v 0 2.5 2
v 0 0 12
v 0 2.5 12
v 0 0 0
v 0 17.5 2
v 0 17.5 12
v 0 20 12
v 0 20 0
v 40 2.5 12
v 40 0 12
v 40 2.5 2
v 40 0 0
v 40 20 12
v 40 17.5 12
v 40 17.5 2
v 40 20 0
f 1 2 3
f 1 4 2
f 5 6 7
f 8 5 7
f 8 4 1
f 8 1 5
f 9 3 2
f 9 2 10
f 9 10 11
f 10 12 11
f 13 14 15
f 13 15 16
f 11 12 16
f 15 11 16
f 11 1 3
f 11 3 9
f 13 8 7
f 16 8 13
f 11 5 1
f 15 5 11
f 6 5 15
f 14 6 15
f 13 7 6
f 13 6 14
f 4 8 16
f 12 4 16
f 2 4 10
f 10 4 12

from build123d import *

# Parameters (mm, degrees)
SKETCH_W     = 40
SKETCH_H     = 20
PAD_DEPTH    = 2
SKETCH001_W  = 40
SKETCH001_H  = 2.5
PAD001_DEPTH = 10


with BuildPart() as part:
    # Sketch → Pad (new body)
    with BuildSketch(Plane.XY):
        with Locations((20, 10)):
            Rectangle(SKETCH_W, SKETCH_H)
    extrude(amount=PAD_DEPTH)

    # Sketch001 (on Face6 of Pad) → Pad001 (join)
    with BuildSketch(Plane.XY.offset(2)):
        with Locations((20, 1.25)):
            Rectangle(SKETCH001_W, SKETCH001_H)
        with Locations((20, 18.75)):
            Rectangle(SKETCH001_W, SKETCH001_H)
        Polygon((0, 2.5), (0, 0), align=None)
    extrude(amount=PAD001_DEPTH)


solid = part.part
